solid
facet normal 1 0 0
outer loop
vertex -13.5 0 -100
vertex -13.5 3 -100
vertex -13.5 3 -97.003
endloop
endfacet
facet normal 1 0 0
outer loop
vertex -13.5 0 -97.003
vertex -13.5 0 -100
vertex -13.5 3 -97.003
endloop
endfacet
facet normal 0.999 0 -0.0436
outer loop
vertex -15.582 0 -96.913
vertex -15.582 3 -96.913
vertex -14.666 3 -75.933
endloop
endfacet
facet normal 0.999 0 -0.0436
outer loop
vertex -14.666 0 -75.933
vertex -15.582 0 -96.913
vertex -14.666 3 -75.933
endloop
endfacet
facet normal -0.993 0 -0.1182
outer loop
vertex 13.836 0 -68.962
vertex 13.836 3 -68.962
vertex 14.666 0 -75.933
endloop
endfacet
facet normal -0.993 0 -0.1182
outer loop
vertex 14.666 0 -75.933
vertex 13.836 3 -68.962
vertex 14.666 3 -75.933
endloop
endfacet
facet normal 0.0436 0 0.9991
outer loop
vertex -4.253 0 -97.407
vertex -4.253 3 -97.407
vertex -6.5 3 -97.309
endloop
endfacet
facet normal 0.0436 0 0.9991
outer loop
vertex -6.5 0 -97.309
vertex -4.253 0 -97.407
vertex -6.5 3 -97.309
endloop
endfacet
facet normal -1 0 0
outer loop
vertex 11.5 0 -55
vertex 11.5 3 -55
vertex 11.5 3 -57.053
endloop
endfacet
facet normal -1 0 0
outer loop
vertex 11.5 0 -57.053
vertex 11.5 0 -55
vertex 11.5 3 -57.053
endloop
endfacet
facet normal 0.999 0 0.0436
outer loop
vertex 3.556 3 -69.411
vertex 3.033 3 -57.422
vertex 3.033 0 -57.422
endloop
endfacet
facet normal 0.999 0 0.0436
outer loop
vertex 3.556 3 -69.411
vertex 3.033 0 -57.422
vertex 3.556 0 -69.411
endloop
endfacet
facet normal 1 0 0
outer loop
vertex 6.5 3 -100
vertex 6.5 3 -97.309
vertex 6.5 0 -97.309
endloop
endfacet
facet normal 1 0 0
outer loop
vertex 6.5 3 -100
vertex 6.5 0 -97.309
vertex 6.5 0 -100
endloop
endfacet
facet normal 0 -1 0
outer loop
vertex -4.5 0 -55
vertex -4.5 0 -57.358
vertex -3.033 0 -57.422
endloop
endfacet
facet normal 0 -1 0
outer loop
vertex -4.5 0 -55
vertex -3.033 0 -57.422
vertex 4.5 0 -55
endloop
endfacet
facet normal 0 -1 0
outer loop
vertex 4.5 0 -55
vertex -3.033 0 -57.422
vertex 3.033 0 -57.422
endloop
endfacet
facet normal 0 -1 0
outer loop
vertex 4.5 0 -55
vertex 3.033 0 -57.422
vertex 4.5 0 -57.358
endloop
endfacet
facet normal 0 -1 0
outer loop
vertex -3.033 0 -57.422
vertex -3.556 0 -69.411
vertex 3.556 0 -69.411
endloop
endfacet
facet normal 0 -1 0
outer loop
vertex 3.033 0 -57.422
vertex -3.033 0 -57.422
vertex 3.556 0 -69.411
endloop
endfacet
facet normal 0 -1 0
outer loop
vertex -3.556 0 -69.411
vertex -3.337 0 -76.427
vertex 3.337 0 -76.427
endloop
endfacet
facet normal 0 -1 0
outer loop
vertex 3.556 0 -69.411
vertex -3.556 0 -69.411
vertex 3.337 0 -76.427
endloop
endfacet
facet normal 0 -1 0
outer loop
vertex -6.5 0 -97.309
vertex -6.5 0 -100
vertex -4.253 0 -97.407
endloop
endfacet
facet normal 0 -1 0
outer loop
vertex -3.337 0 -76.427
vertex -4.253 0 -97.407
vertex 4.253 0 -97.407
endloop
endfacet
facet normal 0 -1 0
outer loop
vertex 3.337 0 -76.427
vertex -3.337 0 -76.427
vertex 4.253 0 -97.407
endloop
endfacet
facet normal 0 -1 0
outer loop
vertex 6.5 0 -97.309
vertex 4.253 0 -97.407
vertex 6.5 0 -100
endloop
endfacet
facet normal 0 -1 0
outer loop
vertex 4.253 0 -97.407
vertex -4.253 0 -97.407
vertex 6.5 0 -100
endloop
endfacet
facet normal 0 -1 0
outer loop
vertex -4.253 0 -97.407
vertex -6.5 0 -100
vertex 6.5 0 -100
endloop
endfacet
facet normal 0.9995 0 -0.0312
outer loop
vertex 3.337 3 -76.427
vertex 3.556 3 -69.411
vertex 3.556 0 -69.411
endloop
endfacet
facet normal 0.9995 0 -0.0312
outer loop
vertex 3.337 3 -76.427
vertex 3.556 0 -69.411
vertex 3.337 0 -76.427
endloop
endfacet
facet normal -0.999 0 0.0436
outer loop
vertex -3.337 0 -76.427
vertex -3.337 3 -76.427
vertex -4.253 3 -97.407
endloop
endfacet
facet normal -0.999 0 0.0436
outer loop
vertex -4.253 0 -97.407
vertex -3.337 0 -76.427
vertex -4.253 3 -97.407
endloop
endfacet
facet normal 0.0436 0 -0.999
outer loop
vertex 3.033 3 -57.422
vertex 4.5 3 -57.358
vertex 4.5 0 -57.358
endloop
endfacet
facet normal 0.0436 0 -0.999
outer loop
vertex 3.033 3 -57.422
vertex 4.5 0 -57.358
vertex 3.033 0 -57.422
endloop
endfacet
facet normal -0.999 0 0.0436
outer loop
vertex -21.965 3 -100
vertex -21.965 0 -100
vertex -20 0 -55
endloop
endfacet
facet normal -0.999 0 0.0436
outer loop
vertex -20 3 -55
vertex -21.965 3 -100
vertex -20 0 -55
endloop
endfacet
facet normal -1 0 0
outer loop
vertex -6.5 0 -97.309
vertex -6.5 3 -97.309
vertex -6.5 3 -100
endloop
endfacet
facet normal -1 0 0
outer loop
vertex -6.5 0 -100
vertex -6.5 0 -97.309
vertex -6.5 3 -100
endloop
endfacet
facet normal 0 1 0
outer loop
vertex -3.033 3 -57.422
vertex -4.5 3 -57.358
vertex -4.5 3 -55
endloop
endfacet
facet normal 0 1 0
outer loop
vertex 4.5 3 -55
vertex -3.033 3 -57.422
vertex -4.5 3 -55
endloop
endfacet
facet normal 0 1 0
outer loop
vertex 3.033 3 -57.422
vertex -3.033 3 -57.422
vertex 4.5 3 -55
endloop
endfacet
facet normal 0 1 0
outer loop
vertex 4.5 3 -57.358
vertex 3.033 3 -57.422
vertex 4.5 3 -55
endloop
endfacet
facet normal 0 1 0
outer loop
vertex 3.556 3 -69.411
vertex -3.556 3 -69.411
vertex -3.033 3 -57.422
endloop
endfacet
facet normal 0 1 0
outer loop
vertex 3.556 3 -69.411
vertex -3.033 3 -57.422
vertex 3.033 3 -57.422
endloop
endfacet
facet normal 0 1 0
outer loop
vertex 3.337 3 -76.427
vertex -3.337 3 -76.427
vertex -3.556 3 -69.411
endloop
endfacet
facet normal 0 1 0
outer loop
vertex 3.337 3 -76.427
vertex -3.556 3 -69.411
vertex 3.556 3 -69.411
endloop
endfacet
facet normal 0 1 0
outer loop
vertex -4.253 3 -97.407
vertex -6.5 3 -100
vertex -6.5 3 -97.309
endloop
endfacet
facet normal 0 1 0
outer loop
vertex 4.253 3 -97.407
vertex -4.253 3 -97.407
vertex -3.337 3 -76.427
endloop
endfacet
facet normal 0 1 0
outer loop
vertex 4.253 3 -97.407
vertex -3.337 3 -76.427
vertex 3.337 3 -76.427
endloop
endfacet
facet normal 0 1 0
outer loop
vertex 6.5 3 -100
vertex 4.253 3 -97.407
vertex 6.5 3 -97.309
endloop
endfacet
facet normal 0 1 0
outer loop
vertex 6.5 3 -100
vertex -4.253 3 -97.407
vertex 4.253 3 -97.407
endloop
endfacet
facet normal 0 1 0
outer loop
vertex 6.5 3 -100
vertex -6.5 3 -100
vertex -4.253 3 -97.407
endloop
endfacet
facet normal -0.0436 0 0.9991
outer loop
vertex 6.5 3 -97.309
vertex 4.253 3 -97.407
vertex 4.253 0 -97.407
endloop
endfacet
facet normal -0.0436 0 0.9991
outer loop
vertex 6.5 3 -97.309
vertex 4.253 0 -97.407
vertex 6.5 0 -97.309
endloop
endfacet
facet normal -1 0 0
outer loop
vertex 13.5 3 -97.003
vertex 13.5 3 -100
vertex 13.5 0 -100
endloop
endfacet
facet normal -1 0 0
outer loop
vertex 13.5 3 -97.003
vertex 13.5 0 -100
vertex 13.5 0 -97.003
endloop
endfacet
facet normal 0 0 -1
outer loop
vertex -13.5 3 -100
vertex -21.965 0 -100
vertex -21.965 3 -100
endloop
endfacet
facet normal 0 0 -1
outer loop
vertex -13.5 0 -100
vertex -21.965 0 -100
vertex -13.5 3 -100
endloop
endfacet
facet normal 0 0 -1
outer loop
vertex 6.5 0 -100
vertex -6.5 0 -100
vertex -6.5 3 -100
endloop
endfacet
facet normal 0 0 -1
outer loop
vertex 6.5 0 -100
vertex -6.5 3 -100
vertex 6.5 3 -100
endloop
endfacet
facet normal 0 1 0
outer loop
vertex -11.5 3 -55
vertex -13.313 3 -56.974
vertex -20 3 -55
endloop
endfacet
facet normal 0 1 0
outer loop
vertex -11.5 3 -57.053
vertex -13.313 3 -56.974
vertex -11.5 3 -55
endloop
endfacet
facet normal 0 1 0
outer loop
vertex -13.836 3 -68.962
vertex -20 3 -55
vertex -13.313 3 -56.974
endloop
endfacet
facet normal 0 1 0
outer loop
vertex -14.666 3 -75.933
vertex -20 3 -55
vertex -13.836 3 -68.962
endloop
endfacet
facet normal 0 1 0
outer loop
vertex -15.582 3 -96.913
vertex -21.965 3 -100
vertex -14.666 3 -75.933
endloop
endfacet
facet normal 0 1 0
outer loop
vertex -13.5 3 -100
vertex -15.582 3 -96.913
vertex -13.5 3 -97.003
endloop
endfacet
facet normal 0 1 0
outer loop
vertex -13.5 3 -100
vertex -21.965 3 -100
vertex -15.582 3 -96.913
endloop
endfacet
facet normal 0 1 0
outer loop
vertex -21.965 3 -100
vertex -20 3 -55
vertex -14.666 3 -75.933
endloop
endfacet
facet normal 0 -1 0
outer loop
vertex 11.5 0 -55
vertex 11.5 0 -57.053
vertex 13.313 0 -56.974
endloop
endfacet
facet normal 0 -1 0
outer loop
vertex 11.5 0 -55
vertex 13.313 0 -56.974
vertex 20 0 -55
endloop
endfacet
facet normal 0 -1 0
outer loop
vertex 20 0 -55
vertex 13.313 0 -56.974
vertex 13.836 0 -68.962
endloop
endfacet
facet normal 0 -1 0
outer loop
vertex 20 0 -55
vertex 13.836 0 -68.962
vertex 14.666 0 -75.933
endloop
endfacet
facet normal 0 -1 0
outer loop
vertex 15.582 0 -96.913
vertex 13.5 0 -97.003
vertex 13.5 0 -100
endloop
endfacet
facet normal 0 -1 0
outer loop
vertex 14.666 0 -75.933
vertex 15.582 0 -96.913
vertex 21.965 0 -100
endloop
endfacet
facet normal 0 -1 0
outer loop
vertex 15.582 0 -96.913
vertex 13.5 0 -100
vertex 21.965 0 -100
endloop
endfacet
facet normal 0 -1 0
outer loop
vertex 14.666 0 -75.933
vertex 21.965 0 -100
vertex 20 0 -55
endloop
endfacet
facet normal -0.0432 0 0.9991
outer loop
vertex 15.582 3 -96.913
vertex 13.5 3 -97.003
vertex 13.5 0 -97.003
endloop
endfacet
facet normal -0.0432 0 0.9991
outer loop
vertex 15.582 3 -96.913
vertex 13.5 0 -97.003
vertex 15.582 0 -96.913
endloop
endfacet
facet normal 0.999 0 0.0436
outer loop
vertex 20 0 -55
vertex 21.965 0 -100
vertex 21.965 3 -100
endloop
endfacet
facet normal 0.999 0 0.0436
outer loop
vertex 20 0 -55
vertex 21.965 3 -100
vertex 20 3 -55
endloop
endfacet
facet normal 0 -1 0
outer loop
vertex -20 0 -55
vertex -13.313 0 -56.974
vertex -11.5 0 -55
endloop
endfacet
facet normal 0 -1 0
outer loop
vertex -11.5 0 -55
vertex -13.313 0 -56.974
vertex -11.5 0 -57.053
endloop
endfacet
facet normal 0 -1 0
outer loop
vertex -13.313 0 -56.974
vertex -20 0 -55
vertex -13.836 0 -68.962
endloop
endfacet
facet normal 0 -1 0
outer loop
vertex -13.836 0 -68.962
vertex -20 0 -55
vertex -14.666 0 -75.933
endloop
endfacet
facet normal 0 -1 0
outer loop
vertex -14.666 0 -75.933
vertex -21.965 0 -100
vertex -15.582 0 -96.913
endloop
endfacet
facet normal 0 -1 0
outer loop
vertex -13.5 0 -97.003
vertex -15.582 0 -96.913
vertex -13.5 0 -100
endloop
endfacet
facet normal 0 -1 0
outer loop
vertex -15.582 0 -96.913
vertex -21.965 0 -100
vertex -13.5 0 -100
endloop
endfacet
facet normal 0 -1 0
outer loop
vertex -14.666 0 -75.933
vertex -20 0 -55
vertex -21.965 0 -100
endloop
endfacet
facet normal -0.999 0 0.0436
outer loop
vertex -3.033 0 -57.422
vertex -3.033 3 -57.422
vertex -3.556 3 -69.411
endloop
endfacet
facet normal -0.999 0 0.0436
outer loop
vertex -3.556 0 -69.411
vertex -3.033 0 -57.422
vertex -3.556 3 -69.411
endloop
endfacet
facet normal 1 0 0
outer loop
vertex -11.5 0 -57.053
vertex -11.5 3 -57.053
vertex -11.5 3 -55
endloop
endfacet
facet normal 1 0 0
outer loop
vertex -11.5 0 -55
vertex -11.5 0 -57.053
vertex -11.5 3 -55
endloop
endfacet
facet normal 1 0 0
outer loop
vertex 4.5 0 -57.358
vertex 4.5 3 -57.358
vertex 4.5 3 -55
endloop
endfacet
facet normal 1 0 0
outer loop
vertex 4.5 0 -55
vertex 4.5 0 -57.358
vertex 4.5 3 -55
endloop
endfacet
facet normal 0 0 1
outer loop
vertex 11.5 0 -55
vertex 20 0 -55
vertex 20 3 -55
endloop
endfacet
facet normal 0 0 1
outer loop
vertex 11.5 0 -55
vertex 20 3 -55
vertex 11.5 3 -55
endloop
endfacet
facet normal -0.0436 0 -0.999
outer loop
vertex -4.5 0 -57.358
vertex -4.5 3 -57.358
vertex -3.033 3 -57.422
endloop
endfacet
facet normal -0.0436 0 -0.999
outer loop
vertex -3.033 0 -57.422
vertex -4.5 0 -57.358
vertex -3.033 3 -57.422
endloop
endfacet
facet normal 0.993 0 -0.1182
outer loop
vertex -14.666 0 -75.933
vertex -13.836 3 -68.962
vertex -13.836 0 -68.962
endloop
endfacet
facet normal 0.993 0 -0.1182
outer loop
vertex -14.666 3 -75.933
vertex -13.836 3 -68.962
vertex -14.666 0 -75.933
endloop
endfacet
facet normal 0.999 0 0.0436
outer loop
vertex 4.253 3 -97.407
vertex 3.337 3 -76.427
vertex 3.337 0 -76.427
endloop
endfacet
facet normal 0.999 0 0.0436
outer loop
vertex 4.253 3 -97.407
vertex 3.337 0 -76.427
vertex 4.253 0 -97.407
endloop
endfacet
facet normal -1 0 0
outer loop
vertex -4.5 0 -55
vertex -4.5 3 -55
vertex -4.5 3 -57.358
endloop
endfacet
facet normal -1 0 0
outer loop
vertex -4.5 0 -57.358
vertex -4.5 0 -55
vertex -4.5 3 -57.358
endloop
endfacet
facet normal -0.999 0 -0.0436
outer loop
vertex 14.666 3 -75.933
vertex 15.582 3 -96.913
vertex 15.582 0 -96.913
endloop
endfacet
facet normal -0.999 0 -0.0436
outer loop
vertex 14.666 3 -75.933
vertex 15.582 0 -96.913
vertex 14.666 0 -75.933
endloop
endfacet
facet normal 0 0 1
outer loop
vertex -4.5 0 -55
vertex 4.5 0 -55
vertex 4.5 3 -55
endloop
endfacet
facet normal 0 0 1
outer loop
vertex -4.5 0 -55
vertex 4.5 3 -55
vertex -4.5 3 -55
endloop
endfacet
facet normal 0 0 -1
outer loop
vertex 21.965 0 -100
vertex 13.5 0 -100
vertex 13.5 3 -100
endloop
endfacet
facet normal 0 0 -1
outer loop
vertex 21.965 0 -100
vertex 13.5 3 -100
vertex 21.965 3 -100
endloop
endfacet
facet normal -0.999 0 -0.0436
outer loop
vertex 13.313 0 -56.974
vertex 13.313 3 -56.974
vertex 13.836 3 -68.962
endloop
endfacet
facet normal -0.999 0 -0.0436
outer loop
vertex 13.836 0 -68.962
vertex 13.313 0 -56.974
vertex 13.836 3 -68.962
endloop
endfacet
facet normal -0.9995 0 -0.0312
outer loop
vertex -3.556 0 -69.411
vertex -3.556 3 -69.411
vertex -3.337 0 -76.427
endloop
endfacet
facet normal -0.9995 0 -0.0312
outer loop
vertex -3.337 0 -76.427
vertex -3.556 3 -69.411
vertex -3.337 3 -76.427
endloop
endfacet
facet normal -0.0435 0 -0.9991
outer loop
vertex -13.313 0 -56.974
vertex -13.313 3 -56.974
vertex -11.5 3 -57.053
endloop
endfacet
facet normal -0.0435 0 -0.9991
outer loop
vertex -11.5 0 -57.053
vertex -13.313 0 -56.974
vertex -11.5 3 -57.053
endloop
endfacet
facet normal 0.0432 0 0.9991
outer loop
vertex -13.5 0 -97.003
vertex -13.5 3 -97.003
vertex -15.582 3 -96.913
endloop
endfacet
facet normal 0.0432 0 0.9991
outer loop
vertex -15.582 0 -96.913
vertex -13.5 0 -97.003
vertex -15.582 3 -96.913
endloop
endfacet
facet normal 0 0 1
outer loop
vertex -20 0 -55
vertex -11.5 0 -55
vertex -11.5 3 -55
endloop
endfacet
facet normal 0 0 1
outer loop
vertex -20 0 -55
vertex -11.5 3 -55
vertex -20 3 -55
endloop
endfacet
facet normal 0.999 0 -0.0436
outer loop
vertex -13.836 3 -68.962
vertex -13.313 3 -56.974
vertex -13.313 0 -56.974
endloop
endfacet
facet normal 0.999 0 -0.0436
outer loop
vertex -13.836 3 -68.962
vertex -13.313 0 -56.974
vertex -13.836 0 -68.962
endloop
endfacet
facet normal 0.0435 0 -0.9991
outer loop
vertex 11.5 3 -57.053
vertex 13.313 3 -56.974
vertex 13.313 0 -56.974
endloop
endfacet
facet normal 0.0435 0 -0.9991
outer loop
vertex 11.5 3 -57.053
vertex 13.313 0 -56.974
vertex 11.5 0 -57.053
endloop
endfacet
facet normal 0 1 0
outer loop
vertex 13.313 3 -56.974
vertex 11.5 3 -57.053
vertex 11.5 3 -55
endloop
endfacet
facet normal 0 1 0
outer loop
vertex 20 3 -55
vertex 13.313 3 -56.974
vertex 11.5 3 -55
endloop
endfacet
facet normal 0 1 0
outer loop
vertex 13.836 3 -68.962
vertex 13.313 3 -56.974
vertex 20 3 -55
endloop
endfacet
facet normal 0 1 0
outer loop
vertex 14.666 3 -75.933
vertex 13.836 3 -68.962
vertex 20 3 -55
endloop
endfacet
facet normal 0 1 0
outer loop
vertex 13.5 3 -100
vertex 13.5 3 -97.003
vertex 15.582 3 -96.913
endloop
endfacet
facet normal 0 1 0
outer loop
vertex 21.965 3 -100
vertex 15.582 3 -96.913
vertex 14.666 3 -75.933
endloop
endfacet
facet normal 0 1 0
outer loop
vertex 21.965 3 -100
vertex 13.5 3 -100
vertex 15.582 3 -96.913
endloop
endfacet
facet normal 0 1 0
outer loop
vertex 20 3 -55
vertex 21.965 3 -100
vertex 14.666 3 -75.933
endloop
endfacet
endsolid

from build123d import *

# Parameters (mm, degrees)
BOSS_EXTRUDE1_DEPTH      = 3
CUT_EXTRUDE1_DEPTH       = 103.427778996
BOSS_EXTRUDE2_DEPTH      = 3
MIRROR4_COPY_1_DEPTH     = 3
CUT_EXTRUDE7_DEPTH       = 103.427778996
CUT_EXTRUDE7_DEPTH_BACK  = 103.427778996
CUT_EXTRUDE8_DEPTH       = 103.427778996
CUT_EXTRUDE8_DEPTH_BACK  = 103.427778996
CUT_EXTRUDE9_DEPTH       = 103.427778996
CUT_EXTRUDE9_DEPTH_BACK  = 103.427778996
CUT_EXTRUDE10_DEPTH      = 103.427778996
CUT_EXTRUDE10_DEPTH_BACK = 103.427778996


with BuildPart() as part:
    # Sketch1 → Boss-Extrude1 (new body)
    with BuildSketch(Plane(origin=(0, 0, 0), x_dir=(1, 0, 0), z_dir=(0, 1, 0))):
        Polygon((-21.964742431, 100), (-20, 55), (0, 55), (0, 100), align=None)
    boss_extrude1 = extrude(amount=BOSS_EXTRUDE1_DEPTH)

    # Sketch2 → Cut-Extrude1 (cut, symmetric)
    with BuildSketch(Plane(origin=(0, 3, 0), x_dir=(1, 0, 0), z_dir=(0, 1, 0))):
        Polygon((-13.837321606, 56.950628888), (-2.508114774, 57.445272741), (-4.252890268, 97.407201604), (-15.582097101, 96.912557752), align=None)
    cut_extrude1 = extrude(amount=CUT_EXTRUDE1_DEPTH, both=True, mode=Mode.SUBTRACT)

    # Sketch6 → Boss-Extrude2 (add)
    with BuildSketch(Plane(origin=(0, 3, 0), x_dir=(1, 0, 0), z_dir=(0, 1, 0))):
        Polygon((-13.837321606, 56.950628888), (-13.31282129, 56.973529067), (-13.836253938, 68.962107726), (-14.666089966, 75.932545098), align=None)
    boss_extrude2 = extrude(amount=-BOSS_EXTRUDE2_DEPTH)

    # Mirror3: Boss-Extrude2 across plane
    add(boss_extrude2.mirror(Plane(origin=(-5.664603416, 0, 0.247321926), x_dir=(0.043619387365336264, 0, 0.9990482215818577), z_dir=(0.9990482215818578, 0, -0.043619387365336264))))

    # Mirror4: Boss-Extrude1, Cut-Extrude1, Boss-Extrude2 across plane
    add(boss_extrude1.mirror(Plane(origin=(0, 0, 0), x_dir=(0, 0, 1), z_dir=(1, 0, 0))))
    add(cut_extrude1.mirror(Plane(origin=(0, 0, 0), x_dir=(0, 0, 1), z_dir=(1, 0, 0))), mode=Mode.SUBTRACT)
    add(boss_extrude2.mirror(Plane(origin=(0, 0, 0), x_dir=(0, 0, 1), z_dir=(1, 0, 0))))

    # Mirror4 copy 1 sketch → Mirror4 copy 1 (add)
    with BuildSketch(Plane(origin=(11.329206833, 3, 0.494643853), x_dir=(0.9961946980917458, 0, 0.08715574274765871), z_dir=(0, 1, 0))):
        Polygon((-13.837321606, 56.950628888), (-13.31282129, 56.973529067), (-13.836253938, 68.962107726), (-14.666089966, 75.932545098), align=None)
    extrude(amount=-MIRROR4_COPY_1_DEPTH)

    # Sketch7 → Cut-Extrude7 (cut, two sides)
    with BuildSketch(Plane(origin=(0, 3, 0), x_dir=(1, 0, 0), z_dir=(0, 1, 0))) as cut_extrude7_sk:
        Polygon((-13.5, 100), (-13.5, 97.003464074), (-6.5, 97.309090675), (-6.5, 100), align=None)
    extrude(amount=CUT_EXTRUDE7_DEPTH, mode=Mode.SUBTRACT)
    extrude(cut_extrude7_sk.sketch, amount=-CUT_EXTRUDE7_DEPTH_BACK, mode=Mode.SUBTRACT)

    # Sketch13 → Cut-Extrude8 (cut, two sides)
    with BuildSketch(Plane(origin=(0, 3, 0), x_dir=(1, 0, 0), z_dir=(0, 1, 0))) as cut_extrude8_sk:
        Polygon((6.5, 97.309090675), (6.5, 100), (13.5, 100), (13.5, 97.003464074), align=None)
    extrude(amount=CUT_EXTRUDE8_DEPTH, mode=Mode.SUBTRACT)
    extrude(cut_extrude8_sk.sketch, amount=-CUT_EXTRUDE8_DEPTH_BACK, mode=Mode.SUBTRACT)

    # Sketch14 → Cut-Extrude9 (cut, two sides)
    with BuildSketch(Plane(origin=(0, 3, 0), x_dir=(1, 0, 0), z_dir=(0, 1, 0))) as cut_extrude9_sk:
        Polygon((-11.5, 57.052678553), (-11.5, 55), (-4.5, 55), (-4.5, 57.358305154), align=None)
    extrude(amount=CUT_EXTRUDE9_DEPTH, mode=Mode.SUBTRACT)
    extrude(cut_extrude9_sk.sketch, amount=-CUT_EXTRUDE9_DEPTH_BACK, mode=Mode.SUBTRACT)


with BuildPart() as cut_extrude9_piece_1:
    # of the separate pieces the step leaves, piece 1, a body of its own (cut_extrude9_pieces)
    add(part.part.solids().sort_by_distance((-4.5, 0, -55))[0])

    # Sketch15 → Cut-Extrude10 (cut, two sides)
    with BuildSketch(Plane(origin=(0, 3, 0), x_dir=(1, 0, 0), z_dir=(0, 1, 0))) as cut_extrude10_sk:
        Polygon((4.5, 57.358305154), (4.5, 55), (11.5, 55), (11.5, 57.052678553), align=None)
    extrude(amount=CUT_EXTRUDE10_DEPTH, mode=Mode.SUBTRACT)
    extrude(cut_extrude10_sk.sketch, amount=-CUT_EXTRUDE10_DEPTH_BACK, mode=Mode.SUBTRACT)


with BuildPart() as cut_extrude9_piece_2:
    # of the separate pieces the step leaves, piece 2, a body of its own (cut_extrude9_pieces)
    add(part.part.solids().sort_by_distance((-21.964742431, 0, -100))[0])


with BuildPart() as cut_extrude10_piece_1:
    # of the separate pieces the step leaves, piece 1, a body of its own (cut_extrude10_pieces)
    add(cut_extrude9_piece_1.part.solids().sort_by_distance((-4.5, 0, -55))[0])


with BuildPart() as cut_extrude10_piece_2:
    # of the separate pieces the step leaves, piece 2, a body of its own (cut_extrude10_pieces)
    add(cut_extrude9_piece_1.part.solids().sort_by_distance((11.5, 0, -55))[0])


solid = Compound([cut_extrude9_piece_2.part, cut_extrude10_piece_1.part, cut_extrude10_piece_2.part])
